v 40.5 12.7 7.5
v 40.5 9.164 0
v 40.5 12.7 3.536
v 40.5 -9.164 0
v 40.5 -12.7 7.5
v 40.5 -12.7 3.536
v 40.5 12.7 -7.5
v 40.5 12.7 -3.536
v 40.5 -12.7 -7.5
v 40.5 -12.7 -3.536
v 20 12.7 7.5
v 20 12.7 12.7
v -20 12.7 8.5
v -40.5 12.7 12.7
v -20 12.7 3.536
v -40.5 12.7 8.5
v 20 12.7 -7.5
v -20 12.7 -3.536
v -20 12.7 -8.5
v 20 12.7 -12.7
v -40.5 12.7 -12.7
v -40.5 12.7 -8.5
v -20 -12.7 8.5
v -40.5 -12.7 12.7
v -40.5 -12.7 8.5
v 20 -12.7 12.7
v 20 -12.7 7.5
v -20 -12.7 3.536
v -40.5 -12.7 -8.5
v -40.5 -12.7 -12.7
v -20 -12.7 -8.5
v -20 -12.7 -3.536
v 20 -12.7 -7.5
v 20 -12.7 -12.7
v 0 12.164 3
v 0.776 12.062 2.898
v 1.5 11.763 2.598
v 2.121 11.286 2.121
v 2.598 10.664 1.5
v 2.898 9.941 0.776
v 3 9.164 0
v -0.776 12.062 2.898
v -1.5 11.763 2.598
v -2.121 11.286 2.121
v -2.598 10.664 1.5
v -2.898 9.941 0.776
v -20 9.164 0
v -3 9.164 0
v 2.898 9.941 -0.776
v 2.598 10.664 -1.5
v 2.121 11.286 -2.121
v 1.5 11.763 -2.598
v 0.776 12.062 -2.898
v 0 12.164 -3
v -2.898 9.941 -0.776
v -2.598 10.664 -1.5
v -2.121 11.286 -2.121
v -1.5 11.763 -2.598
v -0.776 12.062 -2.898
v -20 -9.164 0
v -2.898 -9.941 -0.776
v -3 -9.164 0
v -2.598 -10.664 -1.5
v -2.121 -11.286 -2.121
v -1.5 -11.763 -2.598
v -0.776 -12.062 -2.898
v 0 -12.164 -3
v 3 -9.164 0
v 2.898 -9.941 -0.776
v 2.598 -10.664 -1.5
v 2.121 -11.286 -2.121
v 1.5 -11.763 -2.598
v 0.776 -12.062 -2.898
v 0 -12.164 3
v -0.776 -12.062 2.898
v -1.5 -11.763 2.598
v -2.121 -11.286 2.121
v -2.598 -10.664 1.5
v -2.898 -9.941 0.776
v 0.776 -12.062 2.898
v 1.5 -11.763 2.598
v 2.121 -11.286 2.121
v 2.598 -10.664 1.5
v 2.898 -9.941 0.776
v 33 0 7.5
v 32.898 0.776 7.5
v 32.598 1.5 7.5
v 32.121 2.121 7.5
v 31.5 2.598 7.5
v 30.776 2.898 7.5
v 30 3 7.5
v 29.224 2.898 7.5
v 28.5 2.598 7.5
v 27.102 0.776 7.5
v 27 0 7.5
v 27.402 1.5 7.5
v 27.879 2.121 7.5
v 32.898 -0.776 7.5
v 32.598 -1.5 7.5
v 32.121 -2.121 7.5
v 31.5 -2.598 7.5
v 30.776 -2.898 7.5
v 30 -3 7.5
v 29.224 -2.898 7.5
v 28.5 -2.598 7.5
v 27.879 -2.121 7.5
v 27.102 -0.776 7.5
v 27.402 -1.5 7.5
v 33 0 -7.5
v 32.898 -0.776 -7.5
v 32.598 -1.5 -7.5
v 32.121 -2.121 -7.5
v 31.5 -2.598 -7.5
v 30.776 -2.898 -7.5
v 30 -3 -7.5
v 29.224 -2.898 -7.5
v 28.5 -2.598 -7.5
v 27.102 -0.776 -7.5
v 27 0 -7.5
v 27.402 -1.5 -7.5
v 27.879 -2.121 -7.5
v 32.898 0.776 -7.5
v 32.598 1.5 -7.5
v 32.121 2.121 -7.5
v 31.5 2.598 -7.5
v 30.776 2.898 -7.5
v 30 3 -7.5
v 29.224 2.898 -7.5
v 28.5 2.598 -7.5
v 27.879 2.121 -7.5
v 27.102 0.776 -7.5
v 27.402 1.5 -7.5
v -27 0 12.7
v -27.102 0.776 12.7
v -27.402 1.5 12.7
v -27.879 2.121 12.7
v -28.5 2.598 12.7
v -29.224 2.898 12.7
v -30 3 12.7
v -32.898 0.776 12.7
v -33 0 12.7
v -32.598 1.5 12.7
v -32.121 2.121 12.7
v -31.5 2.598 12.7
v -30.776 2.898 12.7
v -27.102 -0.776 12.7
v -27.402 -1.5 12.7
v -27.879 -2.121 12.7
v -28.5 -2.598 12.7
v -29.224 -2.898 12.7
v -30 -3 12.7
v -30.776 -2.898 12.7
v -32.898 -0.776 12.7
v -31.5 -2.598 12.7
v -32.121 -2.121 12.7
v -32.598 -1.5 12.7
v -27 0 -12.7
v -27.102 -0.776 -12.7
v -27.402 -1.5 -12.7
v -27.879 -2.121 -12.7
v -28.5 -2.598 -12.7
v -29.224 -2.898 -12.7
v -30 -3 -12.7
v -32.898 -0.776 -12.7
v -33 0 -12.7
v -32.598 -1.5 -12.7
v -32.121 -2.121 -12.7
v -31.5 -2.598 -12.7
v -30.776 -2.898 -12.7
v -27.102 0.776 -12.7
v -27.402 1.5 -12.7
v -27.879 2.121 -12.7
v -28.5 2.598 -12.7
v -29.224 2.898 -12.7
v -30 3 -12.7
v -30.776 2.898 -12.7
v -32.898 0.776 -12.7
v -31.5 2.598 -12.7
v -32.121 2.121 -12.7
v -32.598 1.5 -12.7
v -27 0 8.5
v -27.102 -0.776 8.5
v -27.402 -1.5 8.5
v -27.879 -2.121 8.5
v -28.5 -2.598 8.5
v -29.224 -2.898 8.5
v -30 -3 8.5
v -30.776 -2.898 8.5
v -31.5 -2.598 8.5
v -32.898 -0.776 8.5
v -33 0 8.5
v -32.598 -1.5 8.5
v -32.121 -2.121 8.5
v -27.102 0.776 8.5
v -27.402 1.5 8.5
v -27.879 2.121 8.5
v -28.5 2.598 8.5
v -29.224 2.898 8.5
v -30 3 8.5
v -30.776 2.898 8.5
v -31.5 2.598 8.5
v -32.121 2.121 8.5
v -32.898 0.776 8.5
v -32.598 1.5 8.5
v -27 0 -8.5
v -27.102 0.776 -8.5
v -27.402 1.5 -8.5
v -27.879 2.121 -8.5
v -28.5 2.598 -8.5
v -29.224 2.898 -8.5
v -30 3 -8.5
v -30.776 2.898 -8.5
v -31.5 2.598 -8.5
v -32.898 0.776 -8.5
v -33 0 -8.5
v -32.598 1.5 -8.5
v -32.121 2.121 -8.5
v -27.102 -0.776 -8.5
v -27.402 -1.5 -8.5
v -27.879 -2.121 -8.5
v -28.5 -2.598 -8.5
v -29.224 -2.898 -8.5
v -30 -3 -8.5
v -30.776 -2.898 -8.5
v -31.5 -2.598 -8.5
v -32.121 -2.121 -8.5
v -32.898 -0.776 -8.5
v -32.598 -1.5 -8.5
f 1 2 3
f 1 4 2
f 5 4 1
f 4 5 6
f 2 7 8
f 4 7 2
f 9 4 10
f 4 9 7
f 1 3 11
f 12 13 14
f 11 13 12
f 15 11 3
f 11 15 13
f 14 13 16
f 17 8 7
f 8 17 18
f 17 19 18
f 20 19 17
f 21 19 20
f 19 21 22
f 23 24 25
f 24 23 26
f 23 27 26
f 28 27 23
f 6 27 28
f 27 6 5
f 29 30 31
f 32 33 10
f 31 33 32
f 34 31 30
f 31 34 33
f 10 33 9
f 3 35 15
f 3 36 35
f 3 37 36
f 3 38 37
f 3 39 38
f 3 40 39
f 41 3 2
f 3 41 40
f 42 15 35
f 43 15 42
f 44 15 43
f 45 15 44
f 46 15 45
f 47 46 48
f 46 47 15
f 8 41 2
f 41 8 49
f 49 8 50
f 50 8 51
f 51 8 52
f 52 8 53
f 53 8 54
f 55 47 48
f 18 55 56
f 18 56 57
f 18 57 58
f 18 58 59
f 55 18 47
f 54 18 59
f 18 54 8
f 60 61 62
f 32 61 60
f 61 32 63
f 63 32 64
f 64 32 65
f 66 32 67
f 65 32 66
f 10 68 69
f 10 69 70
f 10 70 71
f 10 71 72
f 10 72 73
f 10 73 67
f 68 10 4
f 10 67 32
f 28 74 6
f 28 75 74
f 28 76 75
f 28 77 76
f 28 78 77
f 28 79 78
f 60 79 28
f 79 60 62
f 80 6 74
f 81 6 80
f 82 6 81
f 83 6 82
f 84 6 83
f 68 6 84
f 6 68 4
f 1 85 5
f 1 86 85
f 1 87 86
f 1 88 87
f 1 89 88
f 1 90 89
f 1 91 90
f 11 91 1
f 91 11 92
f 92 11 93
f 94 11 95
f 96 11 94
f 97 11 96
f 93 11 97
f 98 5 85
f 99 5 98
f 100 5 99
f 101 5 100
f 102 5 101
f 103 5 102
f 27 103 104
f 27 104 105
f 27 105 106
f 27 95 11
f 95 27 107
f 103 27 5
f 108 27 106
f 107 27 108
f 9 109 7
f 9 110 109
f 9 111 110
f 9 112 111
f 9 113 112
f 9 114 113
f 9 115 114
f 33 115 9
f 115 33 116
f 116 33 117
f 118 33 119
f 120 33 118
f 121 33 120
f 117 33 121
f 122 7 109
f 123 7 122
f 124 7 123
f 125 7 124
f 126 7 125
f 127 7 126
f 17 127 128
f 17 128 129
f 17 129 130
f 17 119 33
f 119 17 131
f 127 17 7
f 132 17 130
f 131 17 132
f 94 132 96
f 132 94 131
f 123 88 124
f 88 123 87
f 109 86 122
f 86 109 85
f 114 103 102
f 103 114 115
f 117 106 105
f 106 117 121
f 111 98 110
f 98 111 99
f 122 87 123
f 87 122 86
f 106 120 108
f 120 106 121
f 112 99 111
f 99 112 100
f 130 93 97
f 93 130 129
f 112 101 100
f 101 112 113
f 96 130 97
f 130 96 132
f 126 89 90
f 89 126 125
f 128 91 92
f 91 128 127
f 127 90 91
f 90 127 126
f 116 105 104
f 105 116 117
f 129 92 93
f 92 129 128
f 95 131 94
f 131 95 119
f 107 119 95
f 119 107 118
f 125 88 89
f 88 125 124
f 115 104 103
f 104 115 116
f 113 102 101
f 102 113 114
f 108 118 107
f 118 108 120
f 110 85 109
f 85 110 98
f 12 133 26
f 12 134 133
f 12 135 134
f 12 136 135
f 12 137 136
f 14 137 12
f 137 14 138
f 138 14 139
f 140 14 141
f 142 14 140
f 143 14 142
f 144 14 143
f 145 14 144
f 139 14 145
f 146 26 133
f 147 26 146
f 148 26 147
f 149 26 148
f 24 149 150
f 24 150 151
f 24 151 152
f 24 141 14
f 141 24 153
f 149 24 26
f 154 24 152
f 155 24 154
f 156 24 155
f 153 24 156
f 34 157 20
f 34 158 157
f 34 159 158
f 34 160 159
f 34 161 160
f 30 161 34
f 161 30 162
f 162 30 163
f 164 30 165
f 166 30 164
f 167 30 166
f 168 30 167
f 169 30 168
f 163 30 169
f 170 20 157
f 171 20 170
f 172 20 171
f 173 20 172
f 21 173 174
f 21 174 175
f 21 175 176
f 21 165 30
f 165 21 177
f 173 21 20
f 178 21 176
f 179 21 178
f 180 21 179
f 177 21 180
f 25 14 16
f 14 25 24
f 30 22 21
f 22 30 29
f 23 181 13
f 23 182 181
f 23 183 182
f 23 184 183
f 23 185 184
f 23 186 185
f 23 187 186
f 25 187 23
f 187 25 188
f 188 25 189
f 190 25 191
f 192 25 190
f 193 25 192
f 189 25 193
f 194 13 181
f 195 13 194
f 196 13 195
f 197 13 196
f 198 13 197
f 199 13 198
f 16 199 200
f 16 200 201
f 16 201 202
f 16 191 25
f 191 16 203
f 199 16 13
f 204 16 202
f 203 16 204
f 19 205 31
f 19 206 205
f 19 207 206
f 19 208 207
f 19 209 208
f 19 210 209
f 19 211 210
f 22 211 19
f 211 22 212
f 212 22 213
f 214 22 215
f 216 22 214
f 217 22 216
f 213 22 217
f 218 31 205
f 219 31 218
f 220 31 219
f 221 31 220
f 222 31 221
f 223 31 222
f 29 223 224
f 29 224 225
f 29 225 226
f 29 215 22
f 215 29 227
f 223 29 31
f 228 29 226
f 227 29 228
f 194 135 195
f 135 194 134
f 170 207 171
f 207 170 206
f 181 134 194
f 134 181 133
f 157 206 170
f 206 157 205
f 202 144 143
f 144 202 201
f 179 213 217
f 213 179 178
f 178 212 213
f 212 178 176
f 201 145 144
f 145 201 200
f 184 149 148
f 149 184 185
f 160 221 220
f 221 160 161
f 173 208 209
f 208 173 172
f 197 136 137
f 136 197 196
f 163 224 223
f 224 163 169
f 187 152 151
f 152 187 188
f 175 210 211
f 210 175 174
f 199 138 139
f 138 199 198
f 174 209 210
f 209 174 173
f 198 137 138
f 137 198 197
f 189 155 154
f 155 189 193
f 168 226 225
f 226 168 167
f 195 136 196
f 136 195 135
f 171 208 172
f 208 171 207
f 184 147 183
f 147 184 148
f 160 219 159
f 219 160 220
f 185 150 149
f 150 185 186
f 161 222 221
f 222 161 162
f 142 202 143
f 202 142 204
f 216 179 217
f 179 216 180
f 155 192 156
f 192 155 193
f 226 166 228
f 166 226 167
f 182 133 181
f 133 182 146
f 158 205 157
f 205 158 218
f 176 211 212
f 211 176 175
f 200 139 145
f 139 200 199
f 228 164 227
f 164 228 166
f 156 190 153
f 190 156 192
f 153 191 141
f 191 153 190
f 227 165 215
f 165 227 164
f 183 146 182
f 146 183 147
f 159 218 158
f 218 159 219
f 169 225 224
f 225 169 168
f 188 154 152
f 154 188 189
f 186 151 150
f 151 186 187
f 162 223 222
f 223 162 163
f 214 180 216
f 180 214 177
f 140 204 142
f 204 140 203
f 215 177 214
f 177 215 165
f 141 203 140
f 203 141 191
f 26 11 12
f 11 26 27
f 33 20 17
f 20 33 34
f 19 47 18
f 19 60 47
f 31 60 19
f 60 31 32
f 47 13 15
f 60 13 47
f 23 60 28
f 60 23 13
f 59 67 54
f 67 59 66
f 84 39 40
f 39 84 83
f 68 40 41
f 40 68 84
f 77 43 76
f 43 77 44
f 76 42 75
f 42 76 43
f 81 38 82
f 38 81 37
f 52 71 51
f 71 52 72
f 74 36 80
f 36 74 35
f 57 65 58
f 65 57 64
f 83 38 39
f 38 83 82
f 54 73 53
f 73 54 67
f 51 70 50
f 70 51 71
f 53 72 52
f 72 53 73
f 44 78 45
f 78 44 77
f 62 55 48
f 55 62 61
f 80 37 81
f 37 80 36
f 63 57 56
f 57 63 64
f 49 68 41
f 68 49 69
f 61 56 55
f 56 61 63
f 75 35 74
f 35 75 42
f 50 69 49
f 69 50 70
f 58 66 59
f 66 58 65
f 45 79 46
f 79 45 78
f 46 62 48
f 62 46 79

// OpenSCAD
IN_MM = 25.4;
$fn = 24;

RAIL_W = 1*IN_MM;
GROOVE_SIDE = 5;
TOUNGE_L = 20;
HOLE_OR = 3;
TOUNGE_H = 16;
CONTROLLER_H = 150;
MIN_SEP = 30;
MOUNT_L = 40;
CLEARANCE = 1;

module mount() {
    difference() {
        cube([
            MOUNT_L, 
            RAIL_W + 2 * GROOVE_SIDE,
            RAIL_W + 4 * GROOVE_SIDE], center=true);
        difference() {
            cube([MOUNT_L, RAIL_W + CLEARANCE, RAIL_W + 2 * GROOVE_SIDE], center=true);
            
            for (y=[-1,1]) {
                for (z=[-1, 0, 1]) {
                    
                    translate([0, y*(RAIL_W/2 + CLEARANCE), z * (RAIL_W/2 + GROOVE_SIDE)])
                        rotate([45, 0, 0])
                        cube([MOUNT_L, GROOVE_SIDE, GROOVE_SIDE], center=true);
                }
            }
        }
        rotate([90, 0, 0]) 
            cylinder(r=HOLE_OR, h=RAIL_W * 2, center=true);
    }
}

module cross_section(length) {
    difference() {
        cube([length, RAIL_W, RAIL_W], center=true);
        translate([0, RAIL_W/2, 0])
            rotate([45, 0, 0])
            cube([length, GROOVE_SIDE, GROOVE_SIDE], center=true);
        translate([0, -RAIL_W/2, 0])
            rotate([45, 0, 0])
            cube([length, GROOVE_SIDE, GROOVE_SIDE], center=true);
    }
}

module tounge() {
    difference() {
        intersection() {
            cross_section(TOUNGE_L + 1);
            cube([TOUNGE_L + 2, RAIL_W, TOUNGE_H - CLEARANCE], center=true);
        }
        cylinder(r=HOLE_OR, h=RAIL_W, center=true);
    }
}

module slot() {
    difference() {
        cross_section(TOUNGE_L + 1);
        cube([TOUNGE_L + 2, RAIL_W, TOUNGE_H + CLEARANCE], center=true);
        cylinder(r=HOLE_OR, h=RAIL_W, center=true);
    }
}

module straight_rail(length=3 * MIN_SEP) {
    difference() {
        union() {
            translate([length / 2 + TOUNGE_L / 2, 0, 0])
                tounge();
            translate([-length / 2 - TOUNGE_L / 2, 0, 0])
                slot();
            cross_section(length);
        }
    
        rail_holes(length);
    }
}
    
    
module rail_holes(length) {
    num_holes = ceil((length - TOUNGE_L) / MIN_SEP);
    for (i=[0:num_holes-1]) {
        tx = -(num_holes-1) * MIN_SEP / 2 + i * MIN_SEP;
        translate([tx, 0, 0])
            rotate([90, 0, 0])
            cylinder(r=HOLE_OR, h=RAIL_W, center=true);
    }
}

rail_bend = 45;

module bent_rail_stub() {
    difference() {
        cross_section(RAIL_W);
        rotate([0, rail_bend/2, 0])
            translate([0, -RAIL_W/2 - 1, -RAIL_W])
            cube([RAIL_W, RAIL_W+2, 2*RAIL_W]);
    }
}

module bent_rail() {
    translate([-3*RAIL_W/2 - TOUNGE_L/2, 0, 0])
        tounge();
    translate([-RAIL_W, 0, 0])
        cross_section(RAIL_W);
    bent_rail_stub();
    rotate([0, rail_bend, 0]) {
        mirror([1, 0, 0])
            bent_rail_stub();
        translate([RAIL_W, 0, 0])
            cross_section(RAIL_W);
        translate([3*RAIL_W/2 + TOUNGE_L/2, 0, 0])
        slot();
    }
    
}

module tee() {
    translate([MOUNT_L / 2 + TOUNGE_L / 2 + GROOVE_SIDE/2, 0, 0])
        tounge();
    rotate([0, 90, 0])
        mount();
}

module design() {
    translate([(3*RAIL_W + TOUNGE_L) / sqrt(2) + TOUNGE_L + RAIL_W + MOUNT_L, 0, -CONTROLLER_H/2])
        rotate([0, 90, 0])
        straight_rail(CONTROLLER_H);
    # bent_rail();
    * translate([(3*RAIL_W + TOUNGE_L) / sqrt(2), 0, -(3*RAIL_W + TOUNGE_L) / sqrt(2)])
        rotate([0, -135, 0])
        straight_rail((3*RAIL_W + TOUNGE_L)/2);
    translate([(3*RAIL_W + TOUNGE_L) / sqrt(2), 0, -(3*RAIL_W + TOUNGE_L) / sqrt(2)])
        rotate([0, 135, 180])
        bent_rail();
    
    translate([(3*RAIL_W + TOUNGE_L) / sqrt(2) + TOUNGE_L + RAIL_W + MOUNT_L, 0, -(3*RAIL_W + TOUNGE_L) / sqrt(2)])
        rotate([0, 180, 0])
        tee();
    
    * straight_rail();
    * mount();
}
//design();

straight_rail(MOUNT_L);
